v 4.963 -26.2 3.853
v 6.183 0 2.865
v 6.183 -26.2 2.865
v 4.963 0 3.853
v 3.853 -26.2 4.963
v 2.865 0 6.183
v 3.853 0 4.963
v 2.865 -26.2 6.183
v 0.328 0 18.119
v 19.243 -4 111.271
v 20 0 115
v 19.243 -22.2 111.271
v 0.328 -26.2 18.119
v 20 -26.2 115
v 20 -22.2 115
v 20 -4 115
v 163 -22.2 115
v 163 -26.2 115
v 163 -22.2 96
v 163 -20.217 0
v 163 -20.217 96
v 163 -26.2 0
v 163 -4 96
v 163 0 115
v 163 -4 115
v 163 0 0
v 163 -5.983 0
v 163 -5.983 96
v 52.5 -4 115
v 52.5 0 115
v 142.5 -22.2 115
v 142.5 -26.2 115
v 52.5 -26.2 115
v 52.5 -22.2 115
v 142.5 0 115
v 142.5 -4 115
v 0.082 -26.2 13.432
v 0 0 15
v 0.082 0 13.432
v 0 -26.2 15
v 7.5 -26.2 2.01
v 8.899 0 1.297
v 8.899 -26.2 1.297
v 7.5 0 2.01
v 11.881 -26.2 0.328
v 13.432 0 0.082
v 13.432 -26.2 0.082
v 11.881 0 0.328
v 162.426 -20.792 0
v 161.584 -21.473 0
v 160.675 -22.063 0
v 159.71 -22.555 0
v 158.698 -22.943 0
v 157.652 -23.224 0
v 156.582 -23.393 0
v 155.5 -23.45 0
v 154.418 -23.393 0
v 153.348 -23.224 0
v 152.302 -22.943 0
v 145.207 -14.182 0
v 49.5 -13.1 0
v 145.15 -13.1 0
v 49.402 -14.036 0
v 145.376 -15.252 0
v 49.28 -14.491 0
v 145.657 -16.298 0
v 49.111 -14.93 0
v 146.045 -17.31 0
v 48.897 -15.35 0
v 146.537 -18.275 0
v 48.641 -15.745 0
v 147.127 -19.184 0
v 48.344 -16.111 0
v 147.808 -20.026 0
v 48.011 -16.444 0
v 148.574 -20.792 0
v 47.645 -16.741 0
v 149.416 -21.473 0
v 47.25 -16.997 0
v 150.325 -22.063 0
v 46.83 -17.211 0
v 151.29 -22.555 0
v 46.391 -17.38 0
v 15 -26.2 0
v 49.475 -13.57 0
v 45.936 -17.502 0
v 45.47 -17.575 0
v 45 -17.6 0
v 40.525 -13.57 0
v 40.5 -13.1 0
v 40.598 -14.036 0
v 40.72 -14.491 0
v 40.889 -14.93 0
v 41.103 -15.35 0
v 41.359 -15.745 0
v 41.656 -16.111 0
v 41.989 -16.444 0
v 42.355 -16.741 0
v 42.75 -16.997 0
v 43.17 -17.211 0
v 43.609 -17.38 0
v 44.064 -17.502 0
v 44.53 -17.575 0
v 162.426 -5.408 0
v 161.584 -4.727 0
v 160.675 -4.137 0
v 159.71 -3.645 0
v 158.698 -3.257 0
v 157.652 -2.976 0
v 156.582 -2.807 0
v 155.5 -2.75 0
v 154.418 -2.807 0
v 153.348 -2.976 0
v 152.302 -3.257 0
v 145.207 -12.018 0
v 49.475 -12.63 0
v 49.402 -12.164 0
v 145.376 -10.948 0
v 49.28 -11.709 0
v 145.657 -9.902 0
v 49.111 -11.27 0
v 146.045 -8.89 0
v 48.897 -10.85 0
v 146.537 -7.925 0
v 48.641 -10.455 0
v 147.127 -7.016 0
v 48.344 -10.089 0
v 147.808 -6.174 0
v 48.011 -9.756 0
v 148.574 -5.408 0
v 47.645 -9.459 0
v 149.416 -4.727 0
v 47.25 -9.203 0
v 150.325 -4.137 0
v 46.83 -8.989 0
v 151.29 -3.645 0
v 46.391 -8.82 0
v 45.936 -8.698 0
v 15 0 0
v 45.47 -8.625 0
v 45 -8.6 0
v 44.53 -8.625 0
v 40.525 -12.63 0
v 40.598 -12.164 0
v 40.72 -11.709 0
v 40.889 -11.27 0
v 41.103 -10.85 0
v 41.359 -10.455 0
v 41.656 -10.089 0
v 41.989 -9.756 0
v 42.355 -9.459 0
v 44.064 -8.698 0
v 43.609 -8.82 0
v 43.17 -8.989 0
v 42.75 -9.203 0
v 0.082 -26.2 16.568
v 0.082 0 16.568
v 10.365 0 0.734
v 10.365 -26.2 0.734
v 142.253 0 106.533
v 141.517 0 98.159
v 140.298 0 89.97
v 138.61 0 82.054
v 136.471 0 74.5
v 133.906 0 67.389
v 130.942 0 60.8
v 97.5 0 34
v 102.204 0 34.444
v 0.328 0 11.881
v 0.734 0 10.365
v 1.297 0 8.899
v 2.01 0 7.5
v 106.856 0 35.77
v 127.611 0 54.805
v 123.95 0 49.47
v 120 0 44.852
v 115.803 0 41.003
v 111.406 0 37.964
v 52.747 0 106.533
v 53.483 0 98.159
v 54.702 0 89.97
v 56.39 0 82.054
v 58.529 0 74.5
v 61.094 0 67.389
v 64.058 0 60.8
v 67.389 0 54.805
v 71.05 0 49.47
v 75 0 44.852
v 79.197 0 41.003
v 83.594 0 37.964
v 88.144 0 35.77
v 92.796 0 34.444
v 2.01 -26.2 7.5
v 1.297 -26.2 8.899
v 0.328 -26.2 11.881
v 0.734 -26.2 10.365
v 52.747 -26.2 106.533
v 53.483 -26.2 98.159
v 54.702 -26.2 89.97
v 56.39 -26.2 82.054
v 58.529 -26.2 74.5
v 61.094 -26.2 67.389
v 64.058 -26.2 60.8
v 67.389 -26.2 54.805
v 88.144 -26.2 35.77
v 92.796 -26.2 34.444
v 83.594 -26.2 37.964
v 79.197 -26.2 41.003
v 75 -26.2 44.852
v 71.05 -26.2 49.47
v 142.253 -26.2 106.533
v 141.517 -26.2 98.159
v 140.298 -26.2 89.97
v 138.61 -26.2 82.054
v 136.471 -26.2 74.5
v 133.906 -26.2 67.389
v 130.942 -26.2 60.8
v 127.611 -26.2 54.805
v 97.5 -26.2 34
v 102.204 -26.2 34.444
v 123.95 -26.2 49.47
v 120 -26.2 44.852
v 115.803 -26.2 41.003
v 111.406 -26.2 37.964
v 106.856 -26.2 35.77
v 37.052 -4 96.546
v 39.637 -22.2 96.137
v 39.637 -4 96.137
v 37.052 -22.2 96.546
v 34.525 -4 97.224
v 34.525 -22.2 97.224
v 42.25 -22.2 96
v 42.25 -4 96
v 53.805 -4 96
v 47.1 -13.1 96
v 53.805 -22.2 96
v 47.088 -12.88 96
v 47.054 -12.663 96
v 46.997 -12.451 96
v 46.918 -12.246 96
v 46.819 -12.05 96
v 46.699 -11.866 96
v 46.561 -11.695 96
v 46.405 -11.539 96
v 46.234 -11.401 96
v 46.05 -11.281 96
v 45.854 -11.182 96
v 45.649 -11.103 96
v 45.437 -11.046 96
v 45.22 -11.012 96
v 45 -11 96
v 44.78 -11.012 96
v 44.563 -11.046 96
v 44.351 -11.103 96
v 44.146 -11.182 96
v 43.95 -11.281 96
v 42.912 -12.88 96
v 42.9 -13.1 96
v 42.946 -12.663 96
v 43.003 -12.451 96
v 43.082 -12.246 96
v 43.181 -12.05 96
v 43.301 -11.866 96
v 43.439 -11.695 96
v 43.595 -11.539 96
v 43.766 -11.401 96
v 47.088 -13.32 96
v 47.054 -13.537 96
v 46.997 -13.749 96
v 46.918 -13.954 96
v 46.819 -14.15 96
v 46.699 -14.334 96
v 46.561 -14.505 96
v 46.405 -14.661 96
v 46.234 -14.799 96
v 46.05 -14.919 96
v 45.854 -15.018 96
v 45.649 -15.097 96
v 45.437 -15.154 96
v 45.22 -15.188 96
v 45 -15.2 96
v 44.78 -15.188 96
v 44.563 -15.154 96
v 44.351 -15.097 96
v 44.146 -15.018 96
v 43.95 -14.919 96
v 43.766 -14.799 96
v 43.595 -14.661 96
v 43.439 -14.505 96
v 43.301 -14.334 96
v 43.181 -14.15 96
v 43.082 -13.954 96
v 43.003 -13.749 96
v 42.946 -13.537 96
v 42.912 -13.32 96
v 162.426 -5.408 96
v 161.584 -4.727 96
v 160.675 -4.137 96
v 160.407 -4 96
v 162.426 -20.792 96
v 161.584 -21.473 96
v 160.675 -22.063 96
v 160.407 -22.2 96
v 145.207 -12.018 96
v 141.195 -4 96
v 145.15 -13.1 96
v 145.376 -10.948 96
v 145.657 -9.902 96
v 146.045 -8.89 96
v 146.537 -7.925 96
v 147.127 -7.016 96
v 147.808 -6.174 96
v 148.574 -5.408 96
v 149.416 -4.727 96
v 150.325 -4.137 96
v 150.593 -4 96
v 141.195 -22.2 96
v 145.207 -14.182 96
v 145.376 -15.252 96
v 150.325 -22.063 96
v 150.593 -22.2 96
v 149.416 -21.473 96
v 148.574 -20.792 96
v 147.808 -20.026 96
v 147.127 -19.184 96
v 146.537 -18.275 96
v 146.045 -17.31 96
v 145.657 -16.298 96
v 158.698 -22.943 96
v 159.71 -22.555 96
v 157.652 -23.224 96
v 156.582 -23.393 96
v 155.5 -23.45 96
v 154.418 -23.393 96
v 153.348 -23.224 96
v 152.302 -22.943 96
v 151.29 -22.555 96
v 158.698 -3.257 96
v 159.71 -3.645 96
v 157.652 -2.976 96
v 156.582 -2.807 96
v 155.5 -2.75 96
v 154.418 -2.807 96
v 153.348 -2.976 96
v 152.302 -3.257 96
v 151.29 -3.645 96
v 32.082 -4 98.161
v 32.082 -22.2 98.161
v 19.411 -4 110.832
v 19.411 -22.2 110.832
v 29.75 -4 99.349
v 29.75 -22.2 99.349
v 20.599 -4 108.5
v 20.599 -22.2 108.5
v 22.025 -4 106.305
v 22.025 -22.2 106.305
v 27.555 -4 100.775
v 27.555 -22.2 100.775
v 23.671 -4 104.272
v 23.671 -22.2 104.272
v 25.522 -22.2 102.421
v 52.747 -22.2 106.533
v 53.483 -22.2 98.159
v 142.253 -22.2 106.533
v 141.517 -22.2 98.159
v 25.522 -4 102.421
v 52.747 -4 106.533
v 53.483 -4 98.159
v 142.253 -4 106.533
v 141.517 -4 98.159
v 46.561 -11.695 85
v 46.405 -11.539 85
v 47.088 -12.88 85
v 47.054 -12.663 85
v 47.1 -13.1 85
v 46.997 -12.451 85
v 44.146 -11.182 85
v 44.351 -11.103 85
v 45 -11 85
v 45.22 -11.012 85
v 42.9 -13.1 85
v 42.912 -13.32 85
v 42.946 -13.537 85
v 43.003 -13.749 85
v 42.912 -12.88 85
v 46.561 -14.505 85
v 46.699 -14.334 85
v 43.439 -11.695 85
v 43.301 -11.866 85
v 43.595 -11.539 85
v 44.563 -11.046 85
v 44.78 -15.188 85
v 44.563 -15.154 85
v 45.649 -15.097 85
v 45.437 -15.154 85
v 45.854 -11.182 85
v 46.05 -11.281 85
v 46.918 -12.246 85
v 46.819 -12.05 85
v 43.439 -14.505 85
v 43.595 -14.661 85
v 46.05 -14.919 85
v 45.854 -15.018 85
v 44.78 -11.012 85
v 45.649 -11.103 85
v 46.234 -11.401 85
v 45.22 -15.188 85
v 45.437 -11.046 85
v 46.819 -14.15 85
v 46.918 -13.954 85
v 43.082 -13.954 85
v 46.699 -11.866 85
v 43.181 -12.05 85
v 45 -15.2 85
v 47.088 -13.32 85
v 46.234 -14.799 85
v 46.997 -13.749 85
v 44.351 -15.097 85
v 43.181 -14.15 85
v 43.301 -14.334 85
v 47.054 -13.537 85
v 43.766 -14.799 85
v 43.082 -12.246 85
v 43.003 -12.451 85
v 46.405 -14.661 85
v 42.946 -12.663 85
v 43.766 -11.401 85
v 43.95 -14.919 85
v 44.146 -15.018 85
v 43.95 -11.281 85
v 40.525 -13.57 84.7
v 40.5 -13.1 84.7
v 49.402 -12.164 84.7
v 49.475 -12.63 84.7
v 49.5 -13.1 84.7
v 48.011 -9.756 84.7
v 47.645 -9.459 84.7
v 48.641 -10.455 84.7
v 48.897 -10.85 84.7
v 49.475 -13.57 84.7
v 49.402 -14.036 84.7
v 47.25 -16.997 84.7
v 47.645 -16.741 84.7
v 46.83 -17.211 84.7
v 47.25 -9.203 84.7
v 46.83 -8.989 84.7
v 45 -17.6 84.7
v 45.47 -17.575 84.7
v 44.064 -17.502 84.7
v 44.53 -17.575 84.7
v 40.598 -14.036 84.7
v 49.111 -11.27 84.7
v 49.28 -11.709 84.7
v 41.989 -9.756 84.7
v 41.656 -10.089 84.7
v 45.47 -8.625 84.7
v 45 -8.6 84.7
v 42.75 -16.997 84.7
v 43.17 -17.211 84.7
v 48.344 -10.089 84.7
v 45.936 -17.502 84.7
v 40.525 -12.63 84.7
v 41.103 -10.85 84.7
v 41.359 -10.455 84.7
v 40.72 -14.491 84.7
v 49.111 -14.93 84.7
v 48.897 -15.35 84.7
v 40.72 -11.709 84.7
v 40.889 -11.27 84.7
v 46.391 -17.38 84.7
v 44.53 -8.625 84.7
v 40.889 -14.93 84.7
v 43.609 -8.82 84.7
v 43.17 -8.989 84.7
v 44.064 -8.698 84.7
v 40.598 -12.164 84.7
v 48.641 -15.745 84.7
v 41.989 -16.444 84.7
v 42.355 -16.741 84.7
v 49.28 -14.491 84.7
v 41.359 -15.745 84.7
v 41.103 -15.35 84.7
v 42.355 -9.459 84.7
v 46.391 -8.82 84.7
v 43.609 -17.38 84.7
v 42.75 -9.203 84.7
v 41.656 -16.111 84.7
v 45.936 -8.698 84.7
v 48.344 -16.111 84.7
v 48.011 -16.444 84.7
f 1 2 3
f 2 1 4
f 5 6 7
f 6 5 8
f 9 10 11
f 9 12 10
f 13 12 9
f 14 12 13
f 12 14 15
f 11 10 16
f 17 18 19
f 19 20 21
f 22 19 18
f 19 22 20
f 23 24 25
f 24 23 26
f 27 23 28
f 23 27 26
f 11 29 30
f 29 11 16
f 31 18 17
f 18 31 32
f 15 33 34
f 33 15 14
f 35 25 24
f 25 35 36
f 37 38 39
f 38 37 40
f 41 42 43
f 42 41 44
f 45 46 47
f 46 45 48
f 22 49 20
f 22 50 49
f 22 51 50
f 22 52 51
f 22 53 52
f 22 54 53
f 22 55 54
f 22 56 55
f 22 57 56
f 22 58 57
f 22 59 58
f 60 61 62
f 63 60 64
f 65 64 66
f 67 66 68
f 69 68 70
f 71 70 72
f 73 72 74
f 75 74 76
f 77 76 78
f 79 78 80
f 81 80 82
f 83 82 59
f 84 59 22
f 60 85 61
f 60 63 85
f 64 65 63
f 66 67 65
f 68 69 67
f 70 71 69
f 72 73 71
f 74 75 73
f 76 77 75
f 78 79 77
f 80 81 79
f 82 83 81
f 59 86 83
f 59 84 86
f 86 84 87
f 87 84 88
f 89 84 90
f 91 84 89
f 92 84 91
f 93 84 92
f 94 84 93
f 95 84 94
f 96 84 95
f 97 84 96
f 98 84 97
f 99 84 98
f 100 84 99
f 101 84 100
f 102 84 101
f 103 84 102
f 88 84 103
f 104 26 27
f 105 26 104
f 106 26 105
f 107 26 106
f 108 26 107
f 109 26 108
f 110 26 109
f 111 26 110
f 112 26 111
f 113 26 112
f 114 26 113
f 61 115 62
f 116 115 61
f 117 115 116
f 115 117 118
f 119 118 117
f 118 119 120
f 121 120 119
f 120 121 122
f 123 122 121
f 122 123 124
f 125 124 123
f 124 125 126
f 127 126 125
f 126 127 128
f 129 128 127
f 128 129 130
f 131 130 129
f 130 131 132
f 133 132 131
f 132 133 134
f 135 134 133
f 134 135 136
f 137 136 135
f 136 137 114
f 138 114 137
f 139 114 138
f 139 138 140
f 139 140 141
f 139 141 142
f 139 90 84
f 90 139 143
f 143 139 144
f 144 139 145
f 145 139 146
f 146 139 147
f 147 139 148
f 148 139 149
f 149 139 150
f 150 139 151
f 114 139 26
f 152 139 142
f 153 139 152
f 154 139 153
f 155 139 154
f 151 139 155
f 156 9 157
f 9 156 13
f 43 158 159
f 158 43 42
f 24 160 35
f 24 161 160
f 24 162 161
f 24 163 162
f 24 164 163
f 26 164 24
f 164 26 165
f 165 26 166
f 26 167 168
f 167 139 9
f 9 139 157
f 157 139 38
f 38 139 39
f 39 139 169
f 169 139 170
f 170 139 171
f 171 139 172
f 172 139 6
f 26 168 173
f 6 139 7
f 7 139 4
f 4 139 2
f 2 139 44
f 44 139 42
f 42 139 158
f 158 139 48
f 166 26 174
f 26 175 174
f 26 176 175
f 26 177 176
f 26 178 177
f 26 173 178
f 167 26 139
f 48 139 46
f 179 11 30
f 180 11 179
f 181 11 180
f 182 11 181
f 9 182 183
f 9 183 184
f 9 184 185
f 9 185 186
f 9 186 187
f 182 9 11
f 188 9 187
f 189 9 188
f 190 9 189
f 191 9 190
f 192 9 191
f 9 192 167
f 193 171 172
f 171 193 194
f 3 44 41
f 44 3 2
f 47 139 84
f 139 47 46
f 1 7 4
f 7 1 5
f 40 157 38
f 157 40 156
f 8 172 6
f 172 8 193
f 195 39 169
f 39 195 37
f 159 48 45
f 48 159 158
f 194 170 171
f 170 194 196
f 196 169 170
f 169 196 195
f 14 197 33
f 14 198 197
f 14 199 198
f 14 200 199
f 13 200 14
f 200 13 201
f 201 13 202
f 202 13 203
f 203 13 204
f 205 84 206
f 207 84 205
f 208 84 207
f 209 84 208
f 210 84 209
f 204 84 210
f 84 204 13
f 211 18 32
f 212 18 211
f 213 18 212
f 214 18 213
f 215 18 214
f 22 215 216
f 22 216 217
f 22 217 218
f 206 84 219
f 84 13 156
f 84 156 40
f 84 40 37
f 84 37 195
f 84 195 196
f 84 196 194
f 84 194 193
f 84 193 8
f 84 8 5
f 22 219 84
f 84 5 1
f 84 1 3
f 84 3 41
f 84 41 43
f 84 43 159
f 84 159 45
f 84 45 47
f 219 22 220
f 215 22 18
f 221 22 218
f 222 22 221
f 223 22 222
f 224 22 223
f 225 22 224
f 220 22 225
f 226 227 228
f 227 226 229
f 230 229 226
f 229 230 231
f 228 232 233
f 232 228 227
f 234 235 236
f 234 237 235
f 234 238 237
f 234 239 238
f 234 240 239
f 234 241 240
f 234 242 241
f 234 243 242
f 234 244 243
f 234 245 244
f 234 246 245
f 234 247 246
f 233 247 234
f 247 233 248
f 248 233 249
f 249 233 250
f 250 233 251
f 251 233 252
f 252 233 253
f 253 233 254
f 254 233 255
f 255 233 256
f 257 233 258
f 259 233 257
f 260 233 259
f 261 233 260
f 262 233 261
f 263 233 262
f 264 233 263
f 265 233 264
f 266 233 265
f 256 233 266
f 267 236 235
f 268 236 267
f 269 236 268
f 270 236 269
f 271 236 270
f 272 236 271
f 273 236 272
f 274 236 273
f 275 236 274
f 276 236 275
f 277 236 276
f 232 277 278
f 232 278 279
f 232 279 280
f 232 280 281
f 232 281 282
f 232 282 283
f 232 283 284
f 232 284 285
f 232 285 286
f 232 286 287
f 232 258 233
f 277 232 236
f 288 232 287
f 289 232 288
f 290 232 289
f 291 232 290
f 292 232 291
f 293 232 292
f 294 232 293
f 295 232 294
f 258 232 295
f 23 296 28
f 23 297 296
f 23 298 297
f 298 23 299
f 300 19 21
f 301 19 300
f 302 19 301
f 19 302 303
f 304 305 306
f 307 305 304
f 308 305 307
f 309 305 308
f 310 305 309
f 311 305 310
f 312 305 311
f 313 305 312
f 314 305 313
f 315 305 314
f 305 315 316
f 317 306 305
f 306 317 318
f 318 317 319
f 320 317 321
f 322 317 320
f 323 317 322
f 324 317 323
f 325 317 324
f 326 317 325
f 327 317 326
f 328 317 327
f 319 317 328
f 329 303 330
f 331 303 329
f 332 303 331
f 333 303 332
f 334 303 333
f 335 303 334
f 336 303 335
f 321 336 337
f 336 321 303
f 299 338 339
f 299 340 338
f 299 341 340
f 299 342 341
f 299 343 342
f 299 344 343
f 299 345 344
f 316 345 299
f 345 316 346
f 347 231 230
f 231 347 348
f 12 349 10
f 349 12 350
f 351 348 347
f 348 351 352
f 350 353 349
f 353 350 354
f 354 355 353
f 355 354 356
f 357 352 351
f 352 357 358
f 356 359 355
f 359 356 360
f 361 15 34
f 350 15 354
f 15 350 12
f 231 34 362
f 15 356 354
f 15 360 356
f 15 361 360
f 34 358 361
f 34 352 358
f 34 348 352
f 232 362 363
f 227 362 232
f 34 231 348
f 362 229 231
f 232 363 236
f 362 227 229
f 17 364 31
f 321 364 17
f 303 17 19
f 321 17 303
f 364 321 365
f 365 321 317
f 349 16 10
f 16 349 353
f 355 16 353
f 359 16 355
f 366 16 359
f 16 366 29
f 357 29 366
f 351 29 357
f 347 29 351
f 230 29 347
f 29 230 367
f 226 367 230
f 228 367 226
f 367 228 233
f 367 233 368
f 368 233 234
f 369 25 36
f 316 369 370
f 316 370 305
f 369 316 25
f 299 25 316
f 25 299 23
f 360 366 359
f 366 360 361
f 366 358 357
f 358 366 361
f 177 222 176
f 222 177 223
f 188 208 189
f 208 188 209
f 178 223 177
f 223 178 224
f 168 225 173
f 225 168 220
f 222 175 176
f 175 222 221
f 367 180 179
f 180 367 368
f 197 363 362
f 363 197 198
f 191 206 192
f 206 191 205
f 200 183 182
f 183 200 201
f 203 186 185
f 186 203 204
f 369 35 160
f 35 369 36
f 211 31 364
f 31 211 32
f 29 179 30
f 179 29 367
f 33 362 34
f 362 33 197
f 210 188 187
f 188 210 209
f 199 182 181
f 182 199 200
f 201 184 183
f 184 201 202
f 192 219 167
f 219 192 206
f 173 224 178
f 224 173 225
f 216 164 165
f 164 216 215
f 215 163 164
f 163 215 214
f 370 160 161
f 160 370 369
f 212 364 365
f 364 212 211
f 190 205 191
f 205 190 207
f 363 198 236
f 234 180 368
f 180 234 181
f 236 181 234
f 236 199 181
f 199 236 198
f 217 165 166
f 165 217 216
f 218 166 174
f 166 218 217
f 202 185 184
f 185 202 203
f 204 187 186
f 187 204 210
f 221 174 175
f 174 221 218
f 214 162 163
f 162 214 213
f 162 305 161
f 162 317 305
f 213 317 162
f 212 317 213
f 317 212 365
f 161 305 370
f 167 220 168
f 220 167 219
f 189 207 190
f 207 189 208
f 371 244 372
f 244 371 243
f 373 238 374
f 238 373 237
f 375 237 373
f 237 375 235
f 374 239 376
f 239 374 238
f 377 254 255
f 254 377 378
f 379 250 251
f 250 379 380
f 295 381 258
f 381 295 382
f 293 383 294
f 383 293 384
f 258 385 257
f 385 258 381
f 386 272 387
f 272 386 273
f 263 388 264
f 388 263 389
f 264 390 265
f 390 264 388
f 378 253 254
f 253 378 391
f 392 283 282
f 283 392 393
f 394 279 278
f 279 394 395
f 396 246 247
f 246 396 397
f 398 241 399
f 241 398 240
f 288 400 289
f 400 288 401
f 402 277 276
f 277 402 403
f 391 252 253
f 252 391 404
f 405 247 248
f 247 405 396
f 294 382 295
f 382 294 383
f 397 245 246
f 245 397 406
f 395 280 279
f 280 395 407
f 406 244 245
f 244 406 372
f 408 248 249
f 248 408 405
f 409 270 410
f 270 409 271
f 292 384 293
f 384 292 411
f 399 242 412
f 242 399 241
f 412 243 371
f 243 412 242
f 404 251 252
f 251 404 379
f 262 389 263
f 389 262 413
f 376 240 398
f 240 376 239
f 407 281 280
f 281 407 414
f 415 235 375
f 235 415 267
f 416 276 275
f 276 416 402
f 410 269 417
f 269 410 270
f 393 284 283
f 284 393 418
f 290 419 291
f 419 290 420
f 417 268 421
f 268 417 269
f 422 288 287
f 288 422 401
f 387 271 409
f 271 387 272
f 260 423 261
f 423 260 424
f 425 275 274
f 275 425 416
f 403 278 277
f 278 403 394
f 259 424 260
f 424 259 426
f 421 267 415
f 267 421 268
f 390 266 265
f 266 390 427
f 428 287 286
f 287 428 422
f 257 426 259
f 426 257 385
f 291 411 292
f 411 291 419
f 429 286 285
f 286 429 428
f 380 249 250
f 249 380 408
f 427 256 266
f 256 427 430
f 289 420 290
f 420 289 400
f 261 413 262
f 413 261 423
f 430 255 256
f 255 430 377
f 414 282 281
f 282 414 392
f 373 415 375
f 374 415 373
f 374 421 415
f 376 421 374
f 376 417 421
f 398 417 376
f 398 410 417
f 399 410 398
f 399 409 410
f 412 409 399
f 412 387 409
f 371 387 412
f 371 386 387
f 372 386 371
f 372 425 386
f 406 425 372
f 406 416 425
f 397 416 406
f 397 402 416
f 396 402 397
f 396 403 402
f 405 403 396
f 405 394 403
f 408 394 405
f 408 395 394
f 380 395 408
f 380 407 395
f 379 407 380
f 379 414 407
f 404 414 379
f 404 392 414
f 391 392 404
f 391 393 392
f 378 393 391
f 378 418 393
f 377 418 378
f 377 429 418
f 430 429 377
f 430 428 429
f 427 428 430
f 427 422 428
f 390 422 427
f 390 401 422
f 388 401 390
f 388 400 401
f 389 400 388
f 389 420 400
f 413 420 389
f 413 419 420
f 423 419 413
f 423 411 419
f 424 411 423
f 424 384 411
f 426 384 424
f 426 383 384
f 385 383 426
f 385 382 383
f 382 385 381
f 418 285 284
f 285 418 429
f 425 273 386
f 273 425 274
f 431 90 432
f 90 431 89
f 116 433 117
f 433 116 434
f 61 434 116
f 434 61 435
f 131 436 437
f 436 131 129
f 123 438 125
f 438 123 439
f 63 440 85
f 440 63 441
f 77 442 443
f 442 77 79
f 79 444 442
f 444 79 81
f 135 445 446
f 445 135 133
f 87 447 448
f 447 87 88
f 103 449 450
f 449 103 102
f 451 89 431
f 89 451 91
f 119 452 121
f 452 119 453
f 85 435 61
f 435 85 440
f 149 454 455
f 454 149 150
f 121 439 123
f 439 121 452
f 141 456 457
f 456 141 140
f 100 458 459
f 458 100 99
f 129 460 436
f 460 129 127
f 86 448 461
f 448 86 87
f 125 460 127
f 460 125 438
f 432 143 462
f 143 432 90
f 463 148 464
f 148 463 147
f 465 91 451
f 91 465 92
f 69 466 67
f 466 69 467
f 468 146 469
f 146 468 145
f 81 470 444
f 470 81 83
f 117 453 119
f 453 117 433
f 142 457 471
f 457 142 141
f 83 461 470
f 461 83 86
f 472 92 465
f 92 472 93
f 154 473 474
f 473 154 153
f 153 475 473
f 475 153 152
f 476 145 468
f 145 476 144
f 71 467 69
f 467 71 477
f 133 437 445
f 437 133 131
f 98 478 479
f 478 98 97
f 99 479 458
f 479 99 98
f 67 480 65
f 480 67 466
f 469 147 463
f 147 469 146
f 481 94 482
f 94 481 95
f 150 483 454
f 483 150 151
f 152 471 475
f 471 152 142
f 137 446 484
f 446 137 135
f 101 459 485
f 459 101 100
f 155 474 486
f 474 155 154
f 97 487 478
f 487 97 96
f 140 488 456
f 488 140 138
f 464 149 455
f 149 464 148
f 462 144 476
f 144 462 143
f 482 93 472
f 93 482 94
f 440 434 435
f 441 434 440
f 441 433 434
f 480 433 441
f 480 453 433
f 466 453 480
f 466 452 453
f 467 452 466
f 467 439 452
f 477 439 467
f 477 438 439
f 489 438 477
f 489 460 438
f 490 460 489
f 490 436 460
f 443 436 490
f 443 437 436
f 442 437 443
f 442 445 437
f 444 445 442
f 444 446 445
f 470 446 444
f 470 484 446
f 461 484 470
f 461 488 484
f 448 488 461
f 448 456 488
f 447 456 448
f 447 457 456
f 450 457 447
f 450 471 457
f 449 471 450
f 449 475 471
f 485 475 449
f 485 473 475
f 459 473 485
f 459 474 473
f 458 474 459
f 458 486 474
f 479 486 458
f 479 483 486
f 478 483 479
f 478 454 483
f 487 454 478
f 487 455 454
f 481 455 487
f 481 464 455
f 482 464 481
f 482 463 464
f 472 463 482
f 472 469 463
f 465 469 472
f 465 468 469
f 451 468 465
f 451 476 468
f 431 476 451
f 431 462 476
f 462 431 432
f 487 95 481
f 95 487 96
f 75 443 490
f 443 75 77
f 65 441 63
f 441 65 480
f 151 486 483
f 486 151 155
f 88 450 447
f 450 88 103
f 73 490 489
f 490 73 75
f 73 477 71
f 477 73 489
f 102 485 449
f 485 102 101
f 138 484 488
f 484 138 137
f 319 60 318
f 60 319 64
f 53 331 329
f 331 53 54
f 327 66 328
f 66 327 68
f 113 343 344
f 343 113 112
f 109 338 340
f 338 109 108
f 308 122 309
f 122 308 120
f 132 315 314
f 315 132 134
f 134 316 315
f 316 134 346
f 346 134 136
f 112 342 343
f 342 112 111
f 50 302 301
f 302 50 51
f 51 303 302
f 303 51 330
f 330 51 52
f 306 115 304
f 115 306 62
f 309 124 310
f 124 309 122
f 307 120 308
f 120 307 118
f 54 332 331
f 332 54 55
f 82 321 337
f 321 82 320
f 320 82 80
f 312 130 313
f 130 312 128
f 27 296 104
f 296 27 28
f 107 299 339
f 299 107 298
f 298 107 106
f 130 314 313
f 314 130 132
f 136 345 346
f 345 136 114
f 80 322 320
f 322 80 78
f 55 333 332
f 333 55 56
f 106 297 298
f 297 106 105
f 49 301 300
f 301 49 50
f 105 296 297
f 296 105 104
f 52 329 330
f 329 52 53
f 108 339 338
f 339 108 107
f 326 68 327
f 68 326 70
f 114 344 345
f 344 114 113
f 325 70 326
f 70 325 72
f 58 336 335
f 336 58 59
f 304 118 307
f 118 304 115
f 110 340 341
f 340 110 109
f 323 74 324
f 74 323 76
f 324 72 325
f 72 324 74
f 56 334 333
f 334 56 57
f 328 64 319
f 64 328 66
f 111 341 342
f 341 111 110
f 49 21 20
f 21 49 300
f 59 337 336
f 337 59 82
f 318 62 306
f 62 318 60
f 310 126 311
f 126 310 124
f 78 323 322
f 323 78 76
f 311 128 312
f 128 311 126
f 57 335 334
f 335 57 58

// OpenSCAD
frame_w = 18.2;
w = frame_w + 8;
h = 95 + 20;

// flat part
frame_l = 226;

frame_corner_d = 50;

$fn=60;

module mock_frame() {
    translate([frame_corner_d/2,0,0]) hull() {
        cylinder(d=frame_corner_d,h=frame_w);
        translate([frame_l,0,0]) cylinder(d=frame_corner_d,h=frame_w);
    }
}

module _leg(width=135) {
    difference() {
        hull() {
            translate([30/2, 30/2,0]) cylinder(d=30, h=w);
            translate([20,0,0]) cube([width, h, w]);
        }
        translate([42.25,96,4]) hull() {
            translate([0,frame_corner_d/2,0]) cylinder(d=frame_corner_d,h=frame_w);
            cube([width*2,10,frame_w]);
        }
        translate([155/2+20,h,0]) scale([1,1.8,1]) cylinder(d=90,h=w+1);

        translate([45,h-20-10,w/2]) rotate([-90,0,0]) cylinder(d=4.2, h=h);
        translate([45,0,w/2]) rotate([-90,0,0]) cylinder(d=9, h=h-20-10.3);
    }
}

module front_leg() {
    rotate([90,0,0]) difference() {
        union() {
            _leg(135-8);
            translate([20+135,0,w/2]) rotate([-90,0,0]) cylinder(d=w-6,h=h-19);
        }
        translate([20+135,h-20-10,w/2]) rotate([-90,0,0]) cylinder(d=4.2, h=h);
        translate([20+135,0,w/2]) rotate([-90,0,0]) cylinder(d=9, h=h-20-10.3);
    }
}

module back_leg() {
    
    rotate([90,0,0]) difference() {
        _leg(135+8);
        translate([20+135+0.5,0,w/2]) rotate([-90,0,0]) cylinder(d=w-5.5,h=h-19);
    }
    
}

module debug() {
    intersection() {
        union() {
            front_leg();
            translate([155*2+0.5,-w,0]) rotate([0,0,180]) back_leg();
        }
        rotate([90,0,0]) cube([500,500,w/2]);
    }
    %translate([-frame_corner_d/2+42.25,0,h+6]) rotate([90,0,0]) mock_frame();
}

module test_frame() {
    
    scale_x = (frame_l+frame_corner_d+5)/(frame_l+frame_corner_d);
    scale_y = (frame_corner_d+5)/(frame_corner_d);
    
    intersection() {
        difference() {
            scale([scale_x,scale_y,1]) translate([-(frame_l+frame_corner_d)/2,0,0]) mock_frame();
            translate([-(frame_l+frame_corner_d)/2,0,0]) mock_frame();
        }
        cube([frame_l+frame_corner_d+10, 50,20]);
    }
}

//debug();
//test_frame();

//front_leg();
back_leg();
